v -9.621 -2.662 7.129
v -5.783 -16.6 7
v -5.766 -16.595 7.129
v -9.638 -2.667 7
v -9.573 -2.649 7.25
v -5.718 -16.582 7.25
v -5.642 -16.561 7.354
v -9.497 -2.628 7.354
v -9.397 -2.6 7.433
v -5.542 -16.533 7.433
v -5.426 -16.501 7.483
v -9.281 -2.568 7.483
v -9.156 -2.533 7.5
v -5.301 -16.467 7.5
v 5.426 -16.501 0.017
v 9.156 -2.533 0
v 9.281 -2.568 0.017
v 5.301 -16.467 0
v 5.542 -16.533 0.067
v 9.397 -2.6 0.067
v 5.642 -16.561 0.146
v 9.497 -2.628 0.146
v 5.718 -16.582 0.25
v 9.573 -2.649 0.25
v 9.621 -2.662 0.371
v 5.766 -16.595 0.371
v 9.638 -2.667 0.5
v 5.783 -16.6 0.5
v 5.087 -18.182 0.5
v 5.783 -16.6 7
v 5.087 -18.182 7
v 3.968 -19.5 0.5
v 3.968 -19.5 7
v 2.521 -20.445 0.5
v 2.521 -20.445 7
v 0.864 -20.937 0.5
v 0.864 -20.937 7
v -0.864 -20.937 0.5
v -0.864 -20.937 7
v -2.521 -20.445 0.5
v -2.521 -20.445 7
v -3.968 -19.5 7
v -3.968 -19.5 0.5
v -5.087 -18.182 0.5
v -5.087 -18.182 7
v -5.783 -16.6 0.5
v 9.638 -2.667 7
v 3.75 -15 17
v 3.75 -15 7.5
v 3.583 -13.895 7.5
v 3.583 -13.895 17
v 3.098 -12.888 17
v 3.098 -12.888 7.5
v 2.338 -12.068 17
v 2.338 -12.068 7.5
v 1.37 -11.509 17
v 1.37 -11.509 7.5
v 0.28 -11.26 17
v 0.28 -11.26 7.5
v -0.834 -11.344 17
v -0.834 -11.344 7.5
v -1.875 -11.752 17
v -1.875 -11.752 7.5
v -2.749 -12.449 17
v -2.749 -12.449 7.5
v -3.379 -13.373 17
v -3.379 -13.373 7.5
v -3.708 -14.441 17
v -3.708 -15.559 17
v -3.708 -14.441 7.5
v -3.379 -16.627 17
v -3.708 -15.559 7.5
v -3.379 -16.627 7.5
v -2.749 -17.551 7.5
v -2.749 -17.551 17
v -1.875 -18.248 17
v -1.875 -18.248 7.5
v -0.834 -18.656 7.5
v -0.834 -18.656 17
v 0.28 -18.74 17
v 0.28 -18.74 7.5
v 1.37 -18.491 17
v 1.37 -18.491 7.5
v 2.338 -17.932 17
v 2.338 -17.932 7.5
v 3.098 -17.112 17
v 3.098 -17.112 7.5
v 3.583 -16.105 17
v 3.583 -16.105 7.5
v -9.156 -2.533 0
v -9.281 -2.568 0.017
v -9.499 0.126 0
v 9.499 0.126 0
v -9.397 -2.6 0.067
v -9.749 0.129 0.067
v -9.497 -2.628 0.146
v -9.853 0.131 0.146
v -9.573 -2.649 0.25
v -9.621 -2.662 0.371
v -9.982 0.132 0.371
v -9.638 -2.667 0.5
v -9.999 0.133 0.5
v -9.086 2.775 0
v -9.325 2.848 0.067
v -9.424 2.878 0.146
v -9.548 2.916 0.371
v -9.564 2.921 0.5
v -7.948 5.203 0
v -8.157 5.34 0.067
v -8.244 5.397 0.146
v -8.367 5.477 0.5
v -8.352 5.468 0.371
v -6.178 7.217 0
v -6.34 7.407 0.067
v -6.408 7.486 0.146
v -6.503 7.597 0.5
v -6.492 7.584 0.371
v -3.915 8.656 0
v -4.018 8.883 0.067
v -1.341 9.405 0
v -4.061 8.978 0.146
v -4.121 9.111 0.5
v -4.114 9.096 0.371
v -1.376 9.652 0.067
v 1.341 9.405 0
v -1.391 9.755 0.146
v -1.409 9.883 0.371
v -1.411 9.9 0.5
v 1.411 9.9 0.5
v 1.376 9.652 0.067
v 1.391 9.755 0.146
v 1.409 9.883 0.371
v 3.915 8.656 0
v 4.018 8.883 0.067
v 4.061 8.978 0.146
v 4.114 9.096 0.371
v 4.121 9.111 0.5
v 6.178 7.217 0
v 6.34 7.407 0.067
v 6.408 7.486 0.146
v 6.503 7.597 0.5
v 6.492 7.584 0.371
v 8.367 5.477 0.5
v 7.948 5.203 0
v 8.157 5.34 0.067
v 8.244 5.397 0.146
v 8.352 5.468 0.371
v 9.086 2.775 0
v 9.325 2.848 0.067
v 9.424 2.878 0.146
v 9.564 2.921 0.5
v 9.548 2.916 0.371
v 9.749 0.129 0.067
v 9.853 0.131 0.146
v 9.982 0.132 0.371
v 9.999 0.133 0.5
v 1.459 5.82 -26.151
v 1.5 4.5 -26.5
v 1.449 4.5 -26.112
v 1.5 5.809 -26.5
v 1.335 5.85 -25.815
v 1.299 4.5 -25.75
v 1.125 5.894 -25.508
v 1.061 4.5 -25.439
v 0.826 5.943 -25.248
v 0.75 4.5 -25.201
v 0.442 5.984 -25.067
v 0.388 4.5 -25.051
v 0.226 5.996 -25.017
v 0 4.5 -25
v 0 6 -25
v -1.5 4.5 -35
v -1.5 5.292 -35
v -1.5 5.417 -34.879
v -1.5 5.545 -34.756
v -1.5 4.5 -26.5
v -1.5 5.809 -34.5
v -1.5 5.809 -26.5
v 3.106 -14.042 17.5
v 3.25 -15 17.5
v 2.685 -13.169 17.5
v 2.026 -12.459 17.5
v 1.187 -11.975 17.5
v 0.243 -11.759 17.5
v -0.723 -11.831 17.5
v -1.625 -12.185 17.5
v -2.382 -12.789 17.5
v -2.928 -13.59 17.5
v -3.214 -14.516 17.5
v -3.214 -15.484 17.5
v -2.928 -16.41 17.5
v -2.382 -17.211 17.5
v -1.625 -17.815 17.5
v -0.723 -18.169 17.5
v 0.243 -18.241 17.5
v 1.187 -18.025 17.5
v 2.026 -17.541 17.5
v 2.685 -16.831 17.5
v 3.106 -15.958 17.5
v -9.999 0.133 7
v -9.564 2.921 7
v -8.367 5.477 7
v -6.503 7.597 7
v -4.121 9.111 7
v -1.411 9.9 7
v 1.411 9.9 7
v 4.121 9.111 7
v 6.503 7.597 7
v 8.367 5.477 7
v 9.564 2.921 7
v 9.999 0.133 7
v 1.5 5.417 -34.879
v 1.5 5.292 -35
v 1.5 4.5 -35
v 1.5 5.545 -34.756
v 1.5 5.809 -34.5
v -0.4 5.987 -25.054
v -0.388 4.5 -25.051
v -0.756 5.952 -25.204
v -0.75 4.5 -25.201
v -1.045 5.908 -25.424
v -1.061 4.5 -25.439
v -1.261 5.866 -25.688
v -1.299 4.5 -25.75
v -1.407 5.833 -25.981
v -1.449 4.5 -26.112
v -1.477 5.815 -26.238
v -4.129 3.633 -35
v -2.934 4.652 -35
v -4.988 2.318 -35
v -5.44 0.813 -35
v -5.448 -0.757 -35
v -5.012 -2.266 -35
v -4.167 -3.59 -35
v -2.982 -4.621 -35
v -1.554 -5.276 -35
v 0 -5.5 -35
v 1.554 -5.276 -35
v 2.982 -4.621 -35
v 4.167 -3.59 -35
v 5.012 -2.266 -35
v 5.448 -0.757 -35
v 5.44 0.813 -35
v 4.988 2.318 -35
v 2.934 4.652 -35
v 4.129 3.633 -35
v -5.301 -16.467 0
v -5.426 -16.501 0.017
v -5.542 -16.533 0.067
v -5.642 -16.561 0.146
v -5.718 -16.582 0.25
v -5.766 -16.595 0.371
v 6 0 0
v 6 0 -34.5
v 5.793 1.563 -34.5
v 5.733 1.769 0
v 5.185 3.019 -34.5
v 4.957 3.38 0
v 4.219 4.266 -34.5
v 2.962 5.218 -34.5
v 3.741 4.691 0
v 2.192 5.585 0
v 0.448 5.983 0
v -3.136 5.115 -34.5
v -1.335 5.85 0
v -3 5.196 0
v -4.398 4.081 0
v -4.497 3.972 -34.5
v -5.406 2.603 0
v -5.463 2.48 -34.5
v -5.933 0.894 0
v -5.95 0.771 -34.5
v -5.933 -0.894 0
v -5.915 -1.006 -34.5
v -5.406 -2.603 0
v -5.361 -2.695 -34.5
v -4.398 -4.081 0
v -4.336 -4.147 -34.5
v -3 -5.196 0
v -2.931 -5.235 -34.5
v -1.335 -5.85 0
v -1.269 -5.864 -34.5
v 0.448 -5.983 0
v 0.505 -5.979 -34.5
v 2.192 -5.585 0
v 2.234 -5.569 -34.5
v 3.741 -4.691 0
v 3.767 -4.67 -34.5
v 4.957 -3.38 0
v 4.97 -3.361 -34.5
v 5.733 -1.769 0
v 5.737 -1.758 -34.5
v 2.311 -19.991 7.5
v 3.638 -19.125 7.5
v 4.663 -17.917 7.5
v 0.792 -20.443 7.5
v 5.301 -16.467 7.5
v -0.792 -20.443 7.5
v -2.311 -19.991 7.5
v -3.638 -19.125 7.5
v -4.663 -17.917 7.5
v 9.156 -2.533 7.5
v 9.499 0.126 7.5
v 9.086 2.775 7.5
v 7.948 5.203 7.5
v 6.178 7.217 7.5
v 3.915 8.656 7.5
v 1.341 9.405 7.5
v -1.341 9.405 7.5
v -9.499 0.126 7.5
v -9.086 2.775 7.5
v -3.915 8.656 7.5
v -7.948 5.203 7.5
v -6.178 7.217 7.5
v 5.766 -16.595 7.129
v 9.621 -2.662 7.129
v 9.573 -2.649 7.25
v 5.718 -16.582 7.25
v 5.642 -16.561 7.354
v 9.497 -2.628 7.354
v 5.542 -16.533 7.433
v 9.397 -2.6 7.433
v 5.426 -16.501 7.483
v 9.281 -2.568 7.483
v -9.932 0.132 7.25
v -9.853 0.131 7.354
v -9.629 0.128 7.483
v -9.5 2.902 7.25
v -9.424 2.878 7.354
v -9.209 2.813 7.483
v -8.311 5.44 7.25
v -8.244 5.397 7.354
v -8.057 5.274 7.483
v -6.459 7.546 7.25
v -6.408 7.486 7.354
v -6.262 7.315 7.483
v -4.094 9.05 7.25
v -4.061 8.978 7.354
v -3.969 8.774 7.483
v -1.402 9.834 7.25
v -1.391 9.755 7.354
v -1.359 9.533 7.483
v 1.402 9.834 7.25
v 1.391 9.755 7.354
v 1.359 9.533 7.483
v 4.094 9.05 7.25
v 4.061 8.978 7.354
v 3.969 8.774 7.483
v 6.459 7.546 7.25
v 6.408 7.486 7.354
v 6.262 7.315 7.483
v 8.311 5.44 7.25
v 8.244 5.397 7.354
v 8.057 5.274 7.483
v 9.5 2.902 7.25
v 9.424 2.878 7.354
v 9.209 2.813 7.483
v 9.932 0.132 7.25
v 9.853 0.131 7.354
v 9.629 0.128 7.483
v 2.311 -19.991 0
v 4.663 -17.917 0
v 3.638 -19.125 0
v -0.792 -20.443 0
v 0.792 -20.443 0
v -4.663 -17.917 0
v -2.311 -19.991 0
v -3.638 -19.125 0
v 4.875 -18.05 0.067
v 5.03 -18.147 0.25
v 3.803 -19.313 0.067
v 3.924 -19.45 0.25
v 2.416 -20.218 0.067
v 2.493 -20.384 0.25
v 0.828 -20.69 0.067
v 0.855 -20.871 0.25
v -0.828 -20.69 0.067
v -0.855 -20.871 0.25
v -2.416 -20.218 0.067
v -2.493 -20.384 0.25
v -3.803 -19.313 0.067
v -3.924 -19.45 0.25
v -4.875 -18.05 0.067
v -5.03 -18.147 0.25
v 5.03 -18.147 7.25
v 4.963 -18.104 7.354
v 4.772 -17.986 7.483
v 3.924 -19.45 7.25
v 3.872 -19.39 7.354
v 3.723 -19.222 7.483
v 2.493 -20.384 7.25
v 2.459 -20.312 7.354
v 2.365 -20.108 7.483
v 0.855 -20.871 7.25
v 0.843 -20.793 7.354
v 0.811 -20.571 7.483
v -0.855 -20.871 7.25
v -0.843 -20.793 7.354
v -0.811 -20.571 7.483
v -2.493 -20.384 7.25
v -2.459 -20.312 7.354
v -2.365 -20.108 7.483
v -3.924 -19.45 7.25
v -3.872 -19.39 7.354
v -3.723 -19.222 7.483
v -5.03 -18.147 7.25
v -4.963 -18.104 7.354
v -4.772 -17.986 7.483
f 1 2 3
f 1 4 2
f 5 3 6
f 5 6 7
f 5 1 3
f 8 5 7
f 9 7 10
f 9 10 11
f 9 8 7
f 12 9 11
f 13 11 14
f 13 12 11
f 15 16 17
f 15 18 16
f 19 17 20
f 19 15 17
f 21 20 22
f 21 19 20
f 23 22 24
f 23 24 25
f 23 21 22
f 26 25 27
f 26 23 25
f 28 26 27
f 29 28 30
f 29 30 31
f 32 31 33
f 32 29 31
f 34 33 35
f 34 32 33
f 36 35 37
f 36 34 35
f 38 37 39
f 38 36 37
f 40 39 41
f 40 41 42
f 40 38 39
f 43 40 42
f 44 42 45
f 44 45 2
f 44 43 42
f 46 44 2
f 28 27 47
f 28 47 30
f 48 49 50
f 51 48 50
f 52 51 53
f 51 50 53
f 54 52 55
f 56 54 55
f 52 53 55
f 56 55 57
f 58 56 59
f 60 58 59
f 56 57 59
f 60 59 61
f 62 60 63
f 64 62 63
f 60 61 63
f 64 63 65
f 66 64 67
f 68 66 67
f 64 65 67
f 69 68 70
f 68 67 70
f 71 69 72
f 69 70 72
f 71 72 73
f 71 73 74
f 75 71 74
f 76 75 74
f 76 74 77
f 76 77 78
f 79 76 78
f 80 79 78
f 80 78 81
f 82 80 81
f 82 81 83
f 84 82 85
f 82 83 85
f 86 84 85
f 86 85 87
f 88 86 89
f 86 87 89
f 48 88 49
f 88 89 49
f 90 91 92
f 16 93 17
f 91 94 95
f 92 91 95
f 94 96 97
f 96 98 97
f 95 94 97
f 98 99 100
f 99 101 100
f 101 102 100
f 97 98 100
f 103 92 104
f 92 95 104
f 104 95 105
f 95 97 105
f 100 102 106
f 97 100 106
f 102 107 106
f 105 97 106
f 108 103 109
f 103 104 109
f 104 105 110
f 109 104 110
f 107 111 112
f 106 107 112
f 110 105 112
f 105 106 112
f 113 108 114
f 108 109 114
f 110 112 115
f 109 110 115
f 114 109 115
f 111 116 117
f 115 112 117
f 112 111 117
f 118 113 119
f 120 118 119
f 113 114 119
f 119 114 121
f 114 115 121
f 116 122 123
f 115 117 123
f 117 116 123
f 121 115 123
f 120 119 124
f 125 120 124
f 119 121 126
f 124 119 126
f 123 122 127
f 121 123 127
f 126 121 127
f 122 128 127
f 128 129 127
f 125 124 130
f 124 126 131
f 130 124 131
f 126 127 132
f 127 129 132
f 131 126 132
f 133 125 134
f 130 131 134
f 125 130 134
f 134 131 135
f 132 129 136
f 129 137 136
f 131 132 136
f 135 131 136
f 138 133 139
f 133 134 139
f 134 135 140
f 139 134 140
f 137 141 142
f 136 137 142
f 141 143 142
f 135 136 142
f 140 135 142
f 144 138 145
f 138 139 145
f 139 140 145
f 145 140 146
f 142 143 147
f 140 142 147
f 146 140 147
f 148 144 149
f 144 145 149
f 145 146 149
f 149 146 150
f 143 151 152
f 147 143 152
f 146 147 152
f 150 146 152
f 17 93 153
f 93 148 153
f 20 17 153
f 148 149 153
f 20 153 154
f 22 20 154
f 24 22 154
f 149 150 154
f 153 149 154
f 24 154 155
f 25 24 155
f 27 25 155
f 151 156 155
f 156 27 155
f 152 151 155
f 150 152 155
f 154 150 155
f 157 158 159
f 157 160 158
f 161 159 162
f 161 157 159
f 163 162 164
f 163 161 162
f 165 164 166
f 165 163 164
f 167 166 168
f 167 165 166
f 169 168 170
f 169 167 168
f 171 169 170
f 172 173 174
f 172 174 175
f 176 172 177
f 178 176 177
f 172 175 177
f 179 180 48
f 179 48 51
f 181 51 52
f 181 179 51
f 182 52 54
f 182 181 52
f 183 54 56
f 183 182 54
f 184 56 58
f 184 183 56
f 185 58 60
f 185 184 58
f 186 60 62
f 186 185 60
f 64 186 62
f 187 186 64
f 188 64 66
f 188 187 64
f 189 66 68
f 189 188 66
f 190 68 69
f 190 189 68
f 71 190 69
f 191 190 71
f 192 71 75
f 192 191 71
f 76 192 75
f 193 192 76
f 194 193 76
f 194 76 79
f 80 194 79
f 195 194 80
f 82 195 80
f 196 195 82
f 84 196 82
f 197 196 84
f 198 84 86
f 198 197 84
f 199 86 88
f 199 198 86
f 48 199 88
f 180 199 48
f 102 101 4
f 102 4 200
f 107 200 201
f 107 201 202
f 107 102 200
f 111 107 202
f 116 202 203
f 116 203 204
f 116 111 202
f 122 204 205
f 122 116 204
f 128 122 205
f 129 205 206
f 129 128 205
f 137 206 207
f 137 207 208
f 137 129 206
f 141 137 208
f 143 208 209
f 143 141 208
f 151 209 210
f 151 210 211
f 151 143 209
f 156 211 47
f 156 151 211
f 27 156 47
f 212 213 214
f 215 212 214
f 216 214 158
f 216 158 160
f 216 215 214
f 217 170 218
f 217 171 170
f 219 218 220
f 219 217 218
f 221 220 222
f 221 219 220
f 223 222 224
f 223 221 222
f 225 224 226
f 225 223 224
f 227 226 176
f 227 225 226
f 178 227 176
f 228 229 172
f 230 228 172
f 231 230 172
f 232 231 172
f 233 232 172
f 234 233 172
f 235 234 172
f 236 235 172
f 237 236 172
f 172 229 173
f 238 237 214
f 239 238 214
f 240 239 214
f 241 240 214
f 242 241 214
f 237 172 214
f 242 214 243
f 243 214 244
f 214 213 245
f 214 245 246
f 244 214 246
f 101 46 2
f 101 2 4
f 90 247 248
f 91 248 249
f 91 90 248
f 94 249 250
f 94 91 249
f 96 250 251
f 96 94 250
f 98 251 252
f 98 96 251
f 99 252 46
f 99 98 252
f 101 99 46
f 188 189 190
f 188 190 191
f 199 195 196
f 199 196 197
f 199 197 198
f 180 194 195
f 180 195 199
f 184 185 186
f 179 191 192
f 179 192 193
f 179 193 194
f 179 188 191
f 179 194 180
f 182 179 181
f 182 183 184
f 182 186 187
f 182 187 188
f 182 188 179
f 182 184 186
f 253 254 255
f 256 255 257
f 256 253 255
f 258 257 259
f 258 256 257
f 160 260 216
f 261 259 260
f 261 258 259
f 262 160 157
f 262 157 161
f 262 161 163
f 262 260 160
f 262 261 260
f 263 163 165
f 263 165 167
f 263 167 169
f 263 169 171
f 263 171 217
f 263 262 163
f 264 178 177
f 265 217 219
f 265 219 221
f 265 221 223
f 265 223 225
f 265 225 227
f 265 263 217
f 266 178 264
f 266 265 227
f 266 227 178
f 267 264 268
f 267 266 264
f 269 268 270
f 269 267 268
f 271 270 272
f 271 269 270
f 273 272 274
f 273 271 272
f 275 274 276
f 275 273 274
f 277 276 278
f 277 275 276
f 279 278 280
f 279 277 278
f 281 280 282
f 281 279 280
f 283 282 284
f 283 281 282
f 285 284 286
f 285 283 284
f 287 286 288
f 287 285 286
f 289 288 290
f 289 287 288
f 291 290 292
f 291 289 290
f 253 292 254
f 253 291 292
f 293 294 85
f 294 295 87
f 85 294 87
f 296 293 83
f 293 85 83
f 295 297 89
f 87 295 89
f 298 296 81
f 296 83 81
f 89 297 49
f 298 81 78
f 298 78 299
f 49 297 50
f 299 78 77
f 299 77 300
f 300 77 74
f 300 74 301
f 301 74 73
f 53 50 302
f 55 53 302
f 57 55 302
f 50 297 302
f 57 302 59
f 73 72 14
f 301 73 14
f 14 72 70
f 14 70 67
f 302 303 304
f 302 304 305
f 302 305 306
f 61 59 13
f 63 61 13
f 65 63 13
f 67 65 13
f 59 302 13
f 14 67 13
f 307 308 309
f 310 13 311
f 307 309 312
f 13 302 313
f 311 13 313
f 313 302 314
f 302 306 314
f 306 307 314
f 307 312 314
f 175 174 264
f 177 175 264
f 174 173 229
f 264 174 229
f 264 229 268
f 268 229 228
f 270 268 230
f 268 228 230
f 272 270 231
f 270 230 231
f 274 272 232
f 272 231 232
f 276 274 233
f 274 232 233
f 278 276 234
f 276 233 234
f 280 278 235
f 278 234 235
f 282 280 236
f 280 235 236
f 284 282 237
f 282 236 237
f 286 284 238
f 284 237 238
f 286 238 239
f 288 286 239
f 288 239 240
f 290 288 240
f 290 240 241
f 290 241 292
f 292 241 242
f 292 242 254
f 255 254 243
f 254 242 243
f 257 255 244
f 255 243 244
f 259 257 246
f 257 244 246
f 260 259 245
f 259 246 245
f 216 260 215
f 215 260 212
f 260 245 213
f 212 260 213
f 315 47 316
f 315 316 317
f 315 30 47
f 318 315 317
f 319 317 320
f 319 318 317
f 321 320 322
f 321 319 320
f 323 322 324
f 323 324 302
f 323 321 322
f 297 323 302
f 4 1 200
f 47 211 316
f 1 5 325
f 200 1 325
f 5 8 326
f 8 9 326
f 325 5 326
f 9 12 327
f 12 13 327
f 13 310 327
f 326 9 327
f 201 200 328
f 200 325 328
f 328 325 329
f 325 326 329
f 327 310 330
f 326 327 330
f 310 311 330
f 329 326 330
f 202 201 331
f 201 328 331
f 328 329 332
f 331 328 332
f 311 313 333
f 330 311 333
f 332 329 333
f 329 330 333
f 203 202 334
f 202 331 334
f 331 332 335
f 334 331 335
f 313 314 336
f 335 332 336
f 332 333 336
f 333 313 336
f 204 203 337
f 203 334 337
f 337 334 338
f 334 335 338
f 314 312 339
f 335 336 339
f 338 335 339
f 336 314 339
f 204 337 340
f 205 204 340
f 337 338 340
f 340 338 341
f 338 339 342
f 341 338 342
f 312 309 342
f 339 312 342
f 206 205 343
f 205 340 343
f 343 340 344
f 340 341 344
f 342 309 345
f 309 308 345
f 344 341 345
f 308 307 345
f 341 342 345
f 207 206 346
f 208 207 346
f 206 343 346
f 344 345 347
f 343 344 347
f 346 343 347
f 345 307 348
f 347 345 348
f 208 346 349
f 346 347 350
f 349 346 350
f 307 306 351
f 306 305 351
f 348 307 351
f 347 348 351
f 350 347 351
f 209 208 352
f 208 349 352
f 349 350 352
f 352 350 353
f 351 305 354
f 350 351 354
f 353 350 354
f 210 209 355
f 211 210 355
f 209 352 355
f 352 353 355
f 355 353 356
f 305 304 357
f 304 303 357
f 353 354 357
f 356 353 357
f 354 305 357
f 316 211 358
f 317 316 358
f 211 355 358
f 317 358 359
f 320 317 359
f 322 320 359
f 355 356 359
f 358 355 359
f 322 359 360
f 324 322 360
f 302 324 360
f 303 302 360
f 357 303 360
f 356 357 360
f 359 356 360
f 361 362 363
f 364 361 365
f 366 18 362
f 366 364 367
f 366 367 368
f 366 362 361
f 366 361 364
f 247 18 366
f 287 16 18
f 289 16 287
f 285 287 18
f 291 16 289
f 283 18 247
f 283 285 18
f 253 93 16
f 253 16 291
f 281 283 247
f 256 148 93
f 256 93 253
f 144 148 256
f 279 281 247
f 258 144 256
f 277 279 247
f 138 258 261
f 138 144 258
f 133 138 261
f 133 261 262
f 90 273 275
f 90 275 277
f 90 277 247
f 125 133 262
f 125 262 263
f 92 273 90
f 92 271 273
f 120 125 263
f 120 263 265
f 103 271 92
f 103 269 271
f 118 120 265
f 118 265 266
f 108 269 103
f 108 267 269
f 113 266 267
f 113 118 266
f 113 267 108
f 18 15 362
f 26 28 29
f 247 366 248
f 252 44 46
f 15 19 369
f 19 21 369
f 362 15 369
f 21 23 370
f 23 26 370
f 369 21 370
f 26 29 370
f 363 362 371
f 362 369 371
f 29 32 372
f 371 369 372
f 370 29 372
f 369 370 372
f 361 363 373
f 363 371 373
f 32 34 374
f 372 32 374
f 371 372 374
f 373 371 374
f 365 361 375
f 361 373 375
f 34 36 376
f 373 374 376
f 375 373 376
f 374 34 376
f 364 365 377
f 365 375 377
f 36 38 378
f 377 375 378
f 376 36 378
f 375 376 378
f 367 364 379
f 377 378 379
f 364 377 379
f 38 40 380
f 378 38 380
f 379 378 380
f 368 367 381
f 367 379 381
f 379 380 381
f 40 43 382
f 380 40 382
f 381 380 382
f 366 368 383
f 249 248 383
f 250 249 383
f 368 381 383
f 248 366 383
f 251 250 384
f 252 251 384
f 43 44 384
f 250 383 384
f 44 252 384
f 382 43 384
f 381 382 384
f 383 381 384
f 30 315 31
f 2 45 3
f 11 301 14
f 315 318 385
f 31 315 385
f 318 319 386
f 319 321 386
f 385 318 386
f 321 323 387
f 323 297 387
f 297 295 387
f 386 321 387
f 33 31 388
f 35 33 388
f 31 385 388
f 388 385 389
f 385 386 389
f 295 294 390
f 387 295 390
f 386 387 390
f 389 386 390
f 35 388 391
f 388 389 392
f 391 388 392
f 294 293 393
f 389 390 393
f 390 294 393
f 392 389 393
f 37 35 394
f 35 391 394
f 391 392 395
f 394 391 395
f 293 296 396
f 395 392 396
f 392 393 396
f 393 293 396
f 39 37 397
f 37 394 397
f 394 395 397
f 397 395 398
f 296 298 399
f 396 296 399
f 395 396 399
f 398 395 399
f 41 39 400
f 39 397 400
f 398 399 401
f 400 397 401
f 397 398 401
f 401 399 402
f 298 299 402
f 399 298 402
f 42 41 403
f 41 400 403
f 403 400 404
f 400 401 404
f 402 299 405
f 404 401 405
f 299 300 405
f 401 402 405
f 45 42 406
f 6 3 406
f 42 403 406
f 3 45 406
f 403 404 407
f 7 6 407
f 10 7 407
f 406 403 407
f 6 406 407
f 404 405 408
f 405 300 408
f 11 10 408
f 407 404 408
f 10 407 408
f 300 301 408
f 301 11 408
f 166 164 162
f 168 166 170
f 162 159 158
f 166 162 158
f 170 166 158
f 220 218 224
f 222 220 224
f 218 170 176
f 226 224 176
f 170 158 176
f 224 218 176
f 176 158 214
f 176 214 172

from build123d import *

# Parameters (mm, degrees)
SKETCH_1_R          = 6
EXTRUDE_1_DEPTH     = 35
EXTRUDE_2_DEPTH     = 7.5
SKETCH_3_R          = 3.75
EXTRUDE_3_DEPTH     = 10
CHAMFER_1_SIZE      = 0.5
CHAMFER_2_SIZE      = 0.5
SKETCH_5_W          = 3
SKETCH_5_H          = 3
CUT_EXTRUDE_1_DEPTH = 10
FILLET_1_R          = 1.5
FILLET_2_R          = 0.5


with BuildPart() as part:
    # 草图1 → 凸台-拉伸1 (new body)
    with BuildSketch(Plane.XY):
        Circle(SKETCH_1_R)
    extrude(amount=-EXTRUDE_1_DEPTH)

    # 草图2 → 凸台-拉伸2 (add)
    with BuildSketch(Plane.XY):
        with BuildLine():
            Line((9.637888197, -2.666666667), (5.782732918, -16.6))
            ThreePointArc((5.782732918, -16.6), (0, -21), (-5.782732918, -16.6))
            Line((-5.782732918, -16.6), (-9.637888197, -2.666666667))
            ThreePointArc((-9.637888197, -2.666666667), (0, 10), (9.637888197, -2.666666667))
        make_face()
    extrude(amount=EXTRUDE_2_DEPTH)

    # 草图3 → 凸台-拉伸3 (add)
    with BuildSketch(Plane.XY.offset(7.5)):
        with Locations((0, -15)):
            Circle(SKETCH_3_R)
    extrude(amount=EXTRUDE_3_DEPTH)

    # 倒角1
    chamfer_1_edges = [part.edges().sort_by_distance(p)[0] for p in [
        (-3.75, -15, 17.5),
    ]]
    chamfer(chamfer_1_edges, length=CHAMFER_1_SIZE)

    # 倒角2
    chamfer_2_edges = [part.edges().sort_by_distance(p)[0] for p in [
        (-6, 0, -35),
    ]]
    chamfer(chamfer_2_edges, length=CHAMFER_2_SIZE)

    # 草图5 → 切除-拉伸1 (cut)
    with BuildSketch(Plane(origin=(0, 0, -35), x_dir=(-1, 0, 0), z_dir=(0, 0, -1))):
        with Locations((0, 6)):
            Rectangle(SKETCH_5_W, SKETCH_5_H)
    extrude(amount=-CUT_EXTRUDE_1_DEPTH, mode=Mode.SUBTRACT)

    # 圆角1
    fillet_1_edges = [part.edges().sort_by_distance(p)[0] for p in [
        (-1.5, 5.15473751, -25),
        (1.5, 5.15473751, -25),
    ]]
    fillet(fillet_1_edges, radius=FILLET_1_R - 0.0001)  # a hair under: the kernel refuses the full size

    # 圆角2
    fillet_2_edges = [part.edges().sort_by_distance(p)[0] for p in [
        (0, -21, 0),
        (7.710310557, -9.633333333, 0),
        (0, 10, 0),
        (-7.710310557, -9.633333333, 0),
        (0, -21, 7.5),
        (7.710310557, -9.633333333, 7.5),
        (0, 10, 7.5),
        (-7.710310557, -9.633333333, 7.5),
    ]]
    fillet(fillet_2_edges, radius=FILLET_2_R)


solid = part.part
